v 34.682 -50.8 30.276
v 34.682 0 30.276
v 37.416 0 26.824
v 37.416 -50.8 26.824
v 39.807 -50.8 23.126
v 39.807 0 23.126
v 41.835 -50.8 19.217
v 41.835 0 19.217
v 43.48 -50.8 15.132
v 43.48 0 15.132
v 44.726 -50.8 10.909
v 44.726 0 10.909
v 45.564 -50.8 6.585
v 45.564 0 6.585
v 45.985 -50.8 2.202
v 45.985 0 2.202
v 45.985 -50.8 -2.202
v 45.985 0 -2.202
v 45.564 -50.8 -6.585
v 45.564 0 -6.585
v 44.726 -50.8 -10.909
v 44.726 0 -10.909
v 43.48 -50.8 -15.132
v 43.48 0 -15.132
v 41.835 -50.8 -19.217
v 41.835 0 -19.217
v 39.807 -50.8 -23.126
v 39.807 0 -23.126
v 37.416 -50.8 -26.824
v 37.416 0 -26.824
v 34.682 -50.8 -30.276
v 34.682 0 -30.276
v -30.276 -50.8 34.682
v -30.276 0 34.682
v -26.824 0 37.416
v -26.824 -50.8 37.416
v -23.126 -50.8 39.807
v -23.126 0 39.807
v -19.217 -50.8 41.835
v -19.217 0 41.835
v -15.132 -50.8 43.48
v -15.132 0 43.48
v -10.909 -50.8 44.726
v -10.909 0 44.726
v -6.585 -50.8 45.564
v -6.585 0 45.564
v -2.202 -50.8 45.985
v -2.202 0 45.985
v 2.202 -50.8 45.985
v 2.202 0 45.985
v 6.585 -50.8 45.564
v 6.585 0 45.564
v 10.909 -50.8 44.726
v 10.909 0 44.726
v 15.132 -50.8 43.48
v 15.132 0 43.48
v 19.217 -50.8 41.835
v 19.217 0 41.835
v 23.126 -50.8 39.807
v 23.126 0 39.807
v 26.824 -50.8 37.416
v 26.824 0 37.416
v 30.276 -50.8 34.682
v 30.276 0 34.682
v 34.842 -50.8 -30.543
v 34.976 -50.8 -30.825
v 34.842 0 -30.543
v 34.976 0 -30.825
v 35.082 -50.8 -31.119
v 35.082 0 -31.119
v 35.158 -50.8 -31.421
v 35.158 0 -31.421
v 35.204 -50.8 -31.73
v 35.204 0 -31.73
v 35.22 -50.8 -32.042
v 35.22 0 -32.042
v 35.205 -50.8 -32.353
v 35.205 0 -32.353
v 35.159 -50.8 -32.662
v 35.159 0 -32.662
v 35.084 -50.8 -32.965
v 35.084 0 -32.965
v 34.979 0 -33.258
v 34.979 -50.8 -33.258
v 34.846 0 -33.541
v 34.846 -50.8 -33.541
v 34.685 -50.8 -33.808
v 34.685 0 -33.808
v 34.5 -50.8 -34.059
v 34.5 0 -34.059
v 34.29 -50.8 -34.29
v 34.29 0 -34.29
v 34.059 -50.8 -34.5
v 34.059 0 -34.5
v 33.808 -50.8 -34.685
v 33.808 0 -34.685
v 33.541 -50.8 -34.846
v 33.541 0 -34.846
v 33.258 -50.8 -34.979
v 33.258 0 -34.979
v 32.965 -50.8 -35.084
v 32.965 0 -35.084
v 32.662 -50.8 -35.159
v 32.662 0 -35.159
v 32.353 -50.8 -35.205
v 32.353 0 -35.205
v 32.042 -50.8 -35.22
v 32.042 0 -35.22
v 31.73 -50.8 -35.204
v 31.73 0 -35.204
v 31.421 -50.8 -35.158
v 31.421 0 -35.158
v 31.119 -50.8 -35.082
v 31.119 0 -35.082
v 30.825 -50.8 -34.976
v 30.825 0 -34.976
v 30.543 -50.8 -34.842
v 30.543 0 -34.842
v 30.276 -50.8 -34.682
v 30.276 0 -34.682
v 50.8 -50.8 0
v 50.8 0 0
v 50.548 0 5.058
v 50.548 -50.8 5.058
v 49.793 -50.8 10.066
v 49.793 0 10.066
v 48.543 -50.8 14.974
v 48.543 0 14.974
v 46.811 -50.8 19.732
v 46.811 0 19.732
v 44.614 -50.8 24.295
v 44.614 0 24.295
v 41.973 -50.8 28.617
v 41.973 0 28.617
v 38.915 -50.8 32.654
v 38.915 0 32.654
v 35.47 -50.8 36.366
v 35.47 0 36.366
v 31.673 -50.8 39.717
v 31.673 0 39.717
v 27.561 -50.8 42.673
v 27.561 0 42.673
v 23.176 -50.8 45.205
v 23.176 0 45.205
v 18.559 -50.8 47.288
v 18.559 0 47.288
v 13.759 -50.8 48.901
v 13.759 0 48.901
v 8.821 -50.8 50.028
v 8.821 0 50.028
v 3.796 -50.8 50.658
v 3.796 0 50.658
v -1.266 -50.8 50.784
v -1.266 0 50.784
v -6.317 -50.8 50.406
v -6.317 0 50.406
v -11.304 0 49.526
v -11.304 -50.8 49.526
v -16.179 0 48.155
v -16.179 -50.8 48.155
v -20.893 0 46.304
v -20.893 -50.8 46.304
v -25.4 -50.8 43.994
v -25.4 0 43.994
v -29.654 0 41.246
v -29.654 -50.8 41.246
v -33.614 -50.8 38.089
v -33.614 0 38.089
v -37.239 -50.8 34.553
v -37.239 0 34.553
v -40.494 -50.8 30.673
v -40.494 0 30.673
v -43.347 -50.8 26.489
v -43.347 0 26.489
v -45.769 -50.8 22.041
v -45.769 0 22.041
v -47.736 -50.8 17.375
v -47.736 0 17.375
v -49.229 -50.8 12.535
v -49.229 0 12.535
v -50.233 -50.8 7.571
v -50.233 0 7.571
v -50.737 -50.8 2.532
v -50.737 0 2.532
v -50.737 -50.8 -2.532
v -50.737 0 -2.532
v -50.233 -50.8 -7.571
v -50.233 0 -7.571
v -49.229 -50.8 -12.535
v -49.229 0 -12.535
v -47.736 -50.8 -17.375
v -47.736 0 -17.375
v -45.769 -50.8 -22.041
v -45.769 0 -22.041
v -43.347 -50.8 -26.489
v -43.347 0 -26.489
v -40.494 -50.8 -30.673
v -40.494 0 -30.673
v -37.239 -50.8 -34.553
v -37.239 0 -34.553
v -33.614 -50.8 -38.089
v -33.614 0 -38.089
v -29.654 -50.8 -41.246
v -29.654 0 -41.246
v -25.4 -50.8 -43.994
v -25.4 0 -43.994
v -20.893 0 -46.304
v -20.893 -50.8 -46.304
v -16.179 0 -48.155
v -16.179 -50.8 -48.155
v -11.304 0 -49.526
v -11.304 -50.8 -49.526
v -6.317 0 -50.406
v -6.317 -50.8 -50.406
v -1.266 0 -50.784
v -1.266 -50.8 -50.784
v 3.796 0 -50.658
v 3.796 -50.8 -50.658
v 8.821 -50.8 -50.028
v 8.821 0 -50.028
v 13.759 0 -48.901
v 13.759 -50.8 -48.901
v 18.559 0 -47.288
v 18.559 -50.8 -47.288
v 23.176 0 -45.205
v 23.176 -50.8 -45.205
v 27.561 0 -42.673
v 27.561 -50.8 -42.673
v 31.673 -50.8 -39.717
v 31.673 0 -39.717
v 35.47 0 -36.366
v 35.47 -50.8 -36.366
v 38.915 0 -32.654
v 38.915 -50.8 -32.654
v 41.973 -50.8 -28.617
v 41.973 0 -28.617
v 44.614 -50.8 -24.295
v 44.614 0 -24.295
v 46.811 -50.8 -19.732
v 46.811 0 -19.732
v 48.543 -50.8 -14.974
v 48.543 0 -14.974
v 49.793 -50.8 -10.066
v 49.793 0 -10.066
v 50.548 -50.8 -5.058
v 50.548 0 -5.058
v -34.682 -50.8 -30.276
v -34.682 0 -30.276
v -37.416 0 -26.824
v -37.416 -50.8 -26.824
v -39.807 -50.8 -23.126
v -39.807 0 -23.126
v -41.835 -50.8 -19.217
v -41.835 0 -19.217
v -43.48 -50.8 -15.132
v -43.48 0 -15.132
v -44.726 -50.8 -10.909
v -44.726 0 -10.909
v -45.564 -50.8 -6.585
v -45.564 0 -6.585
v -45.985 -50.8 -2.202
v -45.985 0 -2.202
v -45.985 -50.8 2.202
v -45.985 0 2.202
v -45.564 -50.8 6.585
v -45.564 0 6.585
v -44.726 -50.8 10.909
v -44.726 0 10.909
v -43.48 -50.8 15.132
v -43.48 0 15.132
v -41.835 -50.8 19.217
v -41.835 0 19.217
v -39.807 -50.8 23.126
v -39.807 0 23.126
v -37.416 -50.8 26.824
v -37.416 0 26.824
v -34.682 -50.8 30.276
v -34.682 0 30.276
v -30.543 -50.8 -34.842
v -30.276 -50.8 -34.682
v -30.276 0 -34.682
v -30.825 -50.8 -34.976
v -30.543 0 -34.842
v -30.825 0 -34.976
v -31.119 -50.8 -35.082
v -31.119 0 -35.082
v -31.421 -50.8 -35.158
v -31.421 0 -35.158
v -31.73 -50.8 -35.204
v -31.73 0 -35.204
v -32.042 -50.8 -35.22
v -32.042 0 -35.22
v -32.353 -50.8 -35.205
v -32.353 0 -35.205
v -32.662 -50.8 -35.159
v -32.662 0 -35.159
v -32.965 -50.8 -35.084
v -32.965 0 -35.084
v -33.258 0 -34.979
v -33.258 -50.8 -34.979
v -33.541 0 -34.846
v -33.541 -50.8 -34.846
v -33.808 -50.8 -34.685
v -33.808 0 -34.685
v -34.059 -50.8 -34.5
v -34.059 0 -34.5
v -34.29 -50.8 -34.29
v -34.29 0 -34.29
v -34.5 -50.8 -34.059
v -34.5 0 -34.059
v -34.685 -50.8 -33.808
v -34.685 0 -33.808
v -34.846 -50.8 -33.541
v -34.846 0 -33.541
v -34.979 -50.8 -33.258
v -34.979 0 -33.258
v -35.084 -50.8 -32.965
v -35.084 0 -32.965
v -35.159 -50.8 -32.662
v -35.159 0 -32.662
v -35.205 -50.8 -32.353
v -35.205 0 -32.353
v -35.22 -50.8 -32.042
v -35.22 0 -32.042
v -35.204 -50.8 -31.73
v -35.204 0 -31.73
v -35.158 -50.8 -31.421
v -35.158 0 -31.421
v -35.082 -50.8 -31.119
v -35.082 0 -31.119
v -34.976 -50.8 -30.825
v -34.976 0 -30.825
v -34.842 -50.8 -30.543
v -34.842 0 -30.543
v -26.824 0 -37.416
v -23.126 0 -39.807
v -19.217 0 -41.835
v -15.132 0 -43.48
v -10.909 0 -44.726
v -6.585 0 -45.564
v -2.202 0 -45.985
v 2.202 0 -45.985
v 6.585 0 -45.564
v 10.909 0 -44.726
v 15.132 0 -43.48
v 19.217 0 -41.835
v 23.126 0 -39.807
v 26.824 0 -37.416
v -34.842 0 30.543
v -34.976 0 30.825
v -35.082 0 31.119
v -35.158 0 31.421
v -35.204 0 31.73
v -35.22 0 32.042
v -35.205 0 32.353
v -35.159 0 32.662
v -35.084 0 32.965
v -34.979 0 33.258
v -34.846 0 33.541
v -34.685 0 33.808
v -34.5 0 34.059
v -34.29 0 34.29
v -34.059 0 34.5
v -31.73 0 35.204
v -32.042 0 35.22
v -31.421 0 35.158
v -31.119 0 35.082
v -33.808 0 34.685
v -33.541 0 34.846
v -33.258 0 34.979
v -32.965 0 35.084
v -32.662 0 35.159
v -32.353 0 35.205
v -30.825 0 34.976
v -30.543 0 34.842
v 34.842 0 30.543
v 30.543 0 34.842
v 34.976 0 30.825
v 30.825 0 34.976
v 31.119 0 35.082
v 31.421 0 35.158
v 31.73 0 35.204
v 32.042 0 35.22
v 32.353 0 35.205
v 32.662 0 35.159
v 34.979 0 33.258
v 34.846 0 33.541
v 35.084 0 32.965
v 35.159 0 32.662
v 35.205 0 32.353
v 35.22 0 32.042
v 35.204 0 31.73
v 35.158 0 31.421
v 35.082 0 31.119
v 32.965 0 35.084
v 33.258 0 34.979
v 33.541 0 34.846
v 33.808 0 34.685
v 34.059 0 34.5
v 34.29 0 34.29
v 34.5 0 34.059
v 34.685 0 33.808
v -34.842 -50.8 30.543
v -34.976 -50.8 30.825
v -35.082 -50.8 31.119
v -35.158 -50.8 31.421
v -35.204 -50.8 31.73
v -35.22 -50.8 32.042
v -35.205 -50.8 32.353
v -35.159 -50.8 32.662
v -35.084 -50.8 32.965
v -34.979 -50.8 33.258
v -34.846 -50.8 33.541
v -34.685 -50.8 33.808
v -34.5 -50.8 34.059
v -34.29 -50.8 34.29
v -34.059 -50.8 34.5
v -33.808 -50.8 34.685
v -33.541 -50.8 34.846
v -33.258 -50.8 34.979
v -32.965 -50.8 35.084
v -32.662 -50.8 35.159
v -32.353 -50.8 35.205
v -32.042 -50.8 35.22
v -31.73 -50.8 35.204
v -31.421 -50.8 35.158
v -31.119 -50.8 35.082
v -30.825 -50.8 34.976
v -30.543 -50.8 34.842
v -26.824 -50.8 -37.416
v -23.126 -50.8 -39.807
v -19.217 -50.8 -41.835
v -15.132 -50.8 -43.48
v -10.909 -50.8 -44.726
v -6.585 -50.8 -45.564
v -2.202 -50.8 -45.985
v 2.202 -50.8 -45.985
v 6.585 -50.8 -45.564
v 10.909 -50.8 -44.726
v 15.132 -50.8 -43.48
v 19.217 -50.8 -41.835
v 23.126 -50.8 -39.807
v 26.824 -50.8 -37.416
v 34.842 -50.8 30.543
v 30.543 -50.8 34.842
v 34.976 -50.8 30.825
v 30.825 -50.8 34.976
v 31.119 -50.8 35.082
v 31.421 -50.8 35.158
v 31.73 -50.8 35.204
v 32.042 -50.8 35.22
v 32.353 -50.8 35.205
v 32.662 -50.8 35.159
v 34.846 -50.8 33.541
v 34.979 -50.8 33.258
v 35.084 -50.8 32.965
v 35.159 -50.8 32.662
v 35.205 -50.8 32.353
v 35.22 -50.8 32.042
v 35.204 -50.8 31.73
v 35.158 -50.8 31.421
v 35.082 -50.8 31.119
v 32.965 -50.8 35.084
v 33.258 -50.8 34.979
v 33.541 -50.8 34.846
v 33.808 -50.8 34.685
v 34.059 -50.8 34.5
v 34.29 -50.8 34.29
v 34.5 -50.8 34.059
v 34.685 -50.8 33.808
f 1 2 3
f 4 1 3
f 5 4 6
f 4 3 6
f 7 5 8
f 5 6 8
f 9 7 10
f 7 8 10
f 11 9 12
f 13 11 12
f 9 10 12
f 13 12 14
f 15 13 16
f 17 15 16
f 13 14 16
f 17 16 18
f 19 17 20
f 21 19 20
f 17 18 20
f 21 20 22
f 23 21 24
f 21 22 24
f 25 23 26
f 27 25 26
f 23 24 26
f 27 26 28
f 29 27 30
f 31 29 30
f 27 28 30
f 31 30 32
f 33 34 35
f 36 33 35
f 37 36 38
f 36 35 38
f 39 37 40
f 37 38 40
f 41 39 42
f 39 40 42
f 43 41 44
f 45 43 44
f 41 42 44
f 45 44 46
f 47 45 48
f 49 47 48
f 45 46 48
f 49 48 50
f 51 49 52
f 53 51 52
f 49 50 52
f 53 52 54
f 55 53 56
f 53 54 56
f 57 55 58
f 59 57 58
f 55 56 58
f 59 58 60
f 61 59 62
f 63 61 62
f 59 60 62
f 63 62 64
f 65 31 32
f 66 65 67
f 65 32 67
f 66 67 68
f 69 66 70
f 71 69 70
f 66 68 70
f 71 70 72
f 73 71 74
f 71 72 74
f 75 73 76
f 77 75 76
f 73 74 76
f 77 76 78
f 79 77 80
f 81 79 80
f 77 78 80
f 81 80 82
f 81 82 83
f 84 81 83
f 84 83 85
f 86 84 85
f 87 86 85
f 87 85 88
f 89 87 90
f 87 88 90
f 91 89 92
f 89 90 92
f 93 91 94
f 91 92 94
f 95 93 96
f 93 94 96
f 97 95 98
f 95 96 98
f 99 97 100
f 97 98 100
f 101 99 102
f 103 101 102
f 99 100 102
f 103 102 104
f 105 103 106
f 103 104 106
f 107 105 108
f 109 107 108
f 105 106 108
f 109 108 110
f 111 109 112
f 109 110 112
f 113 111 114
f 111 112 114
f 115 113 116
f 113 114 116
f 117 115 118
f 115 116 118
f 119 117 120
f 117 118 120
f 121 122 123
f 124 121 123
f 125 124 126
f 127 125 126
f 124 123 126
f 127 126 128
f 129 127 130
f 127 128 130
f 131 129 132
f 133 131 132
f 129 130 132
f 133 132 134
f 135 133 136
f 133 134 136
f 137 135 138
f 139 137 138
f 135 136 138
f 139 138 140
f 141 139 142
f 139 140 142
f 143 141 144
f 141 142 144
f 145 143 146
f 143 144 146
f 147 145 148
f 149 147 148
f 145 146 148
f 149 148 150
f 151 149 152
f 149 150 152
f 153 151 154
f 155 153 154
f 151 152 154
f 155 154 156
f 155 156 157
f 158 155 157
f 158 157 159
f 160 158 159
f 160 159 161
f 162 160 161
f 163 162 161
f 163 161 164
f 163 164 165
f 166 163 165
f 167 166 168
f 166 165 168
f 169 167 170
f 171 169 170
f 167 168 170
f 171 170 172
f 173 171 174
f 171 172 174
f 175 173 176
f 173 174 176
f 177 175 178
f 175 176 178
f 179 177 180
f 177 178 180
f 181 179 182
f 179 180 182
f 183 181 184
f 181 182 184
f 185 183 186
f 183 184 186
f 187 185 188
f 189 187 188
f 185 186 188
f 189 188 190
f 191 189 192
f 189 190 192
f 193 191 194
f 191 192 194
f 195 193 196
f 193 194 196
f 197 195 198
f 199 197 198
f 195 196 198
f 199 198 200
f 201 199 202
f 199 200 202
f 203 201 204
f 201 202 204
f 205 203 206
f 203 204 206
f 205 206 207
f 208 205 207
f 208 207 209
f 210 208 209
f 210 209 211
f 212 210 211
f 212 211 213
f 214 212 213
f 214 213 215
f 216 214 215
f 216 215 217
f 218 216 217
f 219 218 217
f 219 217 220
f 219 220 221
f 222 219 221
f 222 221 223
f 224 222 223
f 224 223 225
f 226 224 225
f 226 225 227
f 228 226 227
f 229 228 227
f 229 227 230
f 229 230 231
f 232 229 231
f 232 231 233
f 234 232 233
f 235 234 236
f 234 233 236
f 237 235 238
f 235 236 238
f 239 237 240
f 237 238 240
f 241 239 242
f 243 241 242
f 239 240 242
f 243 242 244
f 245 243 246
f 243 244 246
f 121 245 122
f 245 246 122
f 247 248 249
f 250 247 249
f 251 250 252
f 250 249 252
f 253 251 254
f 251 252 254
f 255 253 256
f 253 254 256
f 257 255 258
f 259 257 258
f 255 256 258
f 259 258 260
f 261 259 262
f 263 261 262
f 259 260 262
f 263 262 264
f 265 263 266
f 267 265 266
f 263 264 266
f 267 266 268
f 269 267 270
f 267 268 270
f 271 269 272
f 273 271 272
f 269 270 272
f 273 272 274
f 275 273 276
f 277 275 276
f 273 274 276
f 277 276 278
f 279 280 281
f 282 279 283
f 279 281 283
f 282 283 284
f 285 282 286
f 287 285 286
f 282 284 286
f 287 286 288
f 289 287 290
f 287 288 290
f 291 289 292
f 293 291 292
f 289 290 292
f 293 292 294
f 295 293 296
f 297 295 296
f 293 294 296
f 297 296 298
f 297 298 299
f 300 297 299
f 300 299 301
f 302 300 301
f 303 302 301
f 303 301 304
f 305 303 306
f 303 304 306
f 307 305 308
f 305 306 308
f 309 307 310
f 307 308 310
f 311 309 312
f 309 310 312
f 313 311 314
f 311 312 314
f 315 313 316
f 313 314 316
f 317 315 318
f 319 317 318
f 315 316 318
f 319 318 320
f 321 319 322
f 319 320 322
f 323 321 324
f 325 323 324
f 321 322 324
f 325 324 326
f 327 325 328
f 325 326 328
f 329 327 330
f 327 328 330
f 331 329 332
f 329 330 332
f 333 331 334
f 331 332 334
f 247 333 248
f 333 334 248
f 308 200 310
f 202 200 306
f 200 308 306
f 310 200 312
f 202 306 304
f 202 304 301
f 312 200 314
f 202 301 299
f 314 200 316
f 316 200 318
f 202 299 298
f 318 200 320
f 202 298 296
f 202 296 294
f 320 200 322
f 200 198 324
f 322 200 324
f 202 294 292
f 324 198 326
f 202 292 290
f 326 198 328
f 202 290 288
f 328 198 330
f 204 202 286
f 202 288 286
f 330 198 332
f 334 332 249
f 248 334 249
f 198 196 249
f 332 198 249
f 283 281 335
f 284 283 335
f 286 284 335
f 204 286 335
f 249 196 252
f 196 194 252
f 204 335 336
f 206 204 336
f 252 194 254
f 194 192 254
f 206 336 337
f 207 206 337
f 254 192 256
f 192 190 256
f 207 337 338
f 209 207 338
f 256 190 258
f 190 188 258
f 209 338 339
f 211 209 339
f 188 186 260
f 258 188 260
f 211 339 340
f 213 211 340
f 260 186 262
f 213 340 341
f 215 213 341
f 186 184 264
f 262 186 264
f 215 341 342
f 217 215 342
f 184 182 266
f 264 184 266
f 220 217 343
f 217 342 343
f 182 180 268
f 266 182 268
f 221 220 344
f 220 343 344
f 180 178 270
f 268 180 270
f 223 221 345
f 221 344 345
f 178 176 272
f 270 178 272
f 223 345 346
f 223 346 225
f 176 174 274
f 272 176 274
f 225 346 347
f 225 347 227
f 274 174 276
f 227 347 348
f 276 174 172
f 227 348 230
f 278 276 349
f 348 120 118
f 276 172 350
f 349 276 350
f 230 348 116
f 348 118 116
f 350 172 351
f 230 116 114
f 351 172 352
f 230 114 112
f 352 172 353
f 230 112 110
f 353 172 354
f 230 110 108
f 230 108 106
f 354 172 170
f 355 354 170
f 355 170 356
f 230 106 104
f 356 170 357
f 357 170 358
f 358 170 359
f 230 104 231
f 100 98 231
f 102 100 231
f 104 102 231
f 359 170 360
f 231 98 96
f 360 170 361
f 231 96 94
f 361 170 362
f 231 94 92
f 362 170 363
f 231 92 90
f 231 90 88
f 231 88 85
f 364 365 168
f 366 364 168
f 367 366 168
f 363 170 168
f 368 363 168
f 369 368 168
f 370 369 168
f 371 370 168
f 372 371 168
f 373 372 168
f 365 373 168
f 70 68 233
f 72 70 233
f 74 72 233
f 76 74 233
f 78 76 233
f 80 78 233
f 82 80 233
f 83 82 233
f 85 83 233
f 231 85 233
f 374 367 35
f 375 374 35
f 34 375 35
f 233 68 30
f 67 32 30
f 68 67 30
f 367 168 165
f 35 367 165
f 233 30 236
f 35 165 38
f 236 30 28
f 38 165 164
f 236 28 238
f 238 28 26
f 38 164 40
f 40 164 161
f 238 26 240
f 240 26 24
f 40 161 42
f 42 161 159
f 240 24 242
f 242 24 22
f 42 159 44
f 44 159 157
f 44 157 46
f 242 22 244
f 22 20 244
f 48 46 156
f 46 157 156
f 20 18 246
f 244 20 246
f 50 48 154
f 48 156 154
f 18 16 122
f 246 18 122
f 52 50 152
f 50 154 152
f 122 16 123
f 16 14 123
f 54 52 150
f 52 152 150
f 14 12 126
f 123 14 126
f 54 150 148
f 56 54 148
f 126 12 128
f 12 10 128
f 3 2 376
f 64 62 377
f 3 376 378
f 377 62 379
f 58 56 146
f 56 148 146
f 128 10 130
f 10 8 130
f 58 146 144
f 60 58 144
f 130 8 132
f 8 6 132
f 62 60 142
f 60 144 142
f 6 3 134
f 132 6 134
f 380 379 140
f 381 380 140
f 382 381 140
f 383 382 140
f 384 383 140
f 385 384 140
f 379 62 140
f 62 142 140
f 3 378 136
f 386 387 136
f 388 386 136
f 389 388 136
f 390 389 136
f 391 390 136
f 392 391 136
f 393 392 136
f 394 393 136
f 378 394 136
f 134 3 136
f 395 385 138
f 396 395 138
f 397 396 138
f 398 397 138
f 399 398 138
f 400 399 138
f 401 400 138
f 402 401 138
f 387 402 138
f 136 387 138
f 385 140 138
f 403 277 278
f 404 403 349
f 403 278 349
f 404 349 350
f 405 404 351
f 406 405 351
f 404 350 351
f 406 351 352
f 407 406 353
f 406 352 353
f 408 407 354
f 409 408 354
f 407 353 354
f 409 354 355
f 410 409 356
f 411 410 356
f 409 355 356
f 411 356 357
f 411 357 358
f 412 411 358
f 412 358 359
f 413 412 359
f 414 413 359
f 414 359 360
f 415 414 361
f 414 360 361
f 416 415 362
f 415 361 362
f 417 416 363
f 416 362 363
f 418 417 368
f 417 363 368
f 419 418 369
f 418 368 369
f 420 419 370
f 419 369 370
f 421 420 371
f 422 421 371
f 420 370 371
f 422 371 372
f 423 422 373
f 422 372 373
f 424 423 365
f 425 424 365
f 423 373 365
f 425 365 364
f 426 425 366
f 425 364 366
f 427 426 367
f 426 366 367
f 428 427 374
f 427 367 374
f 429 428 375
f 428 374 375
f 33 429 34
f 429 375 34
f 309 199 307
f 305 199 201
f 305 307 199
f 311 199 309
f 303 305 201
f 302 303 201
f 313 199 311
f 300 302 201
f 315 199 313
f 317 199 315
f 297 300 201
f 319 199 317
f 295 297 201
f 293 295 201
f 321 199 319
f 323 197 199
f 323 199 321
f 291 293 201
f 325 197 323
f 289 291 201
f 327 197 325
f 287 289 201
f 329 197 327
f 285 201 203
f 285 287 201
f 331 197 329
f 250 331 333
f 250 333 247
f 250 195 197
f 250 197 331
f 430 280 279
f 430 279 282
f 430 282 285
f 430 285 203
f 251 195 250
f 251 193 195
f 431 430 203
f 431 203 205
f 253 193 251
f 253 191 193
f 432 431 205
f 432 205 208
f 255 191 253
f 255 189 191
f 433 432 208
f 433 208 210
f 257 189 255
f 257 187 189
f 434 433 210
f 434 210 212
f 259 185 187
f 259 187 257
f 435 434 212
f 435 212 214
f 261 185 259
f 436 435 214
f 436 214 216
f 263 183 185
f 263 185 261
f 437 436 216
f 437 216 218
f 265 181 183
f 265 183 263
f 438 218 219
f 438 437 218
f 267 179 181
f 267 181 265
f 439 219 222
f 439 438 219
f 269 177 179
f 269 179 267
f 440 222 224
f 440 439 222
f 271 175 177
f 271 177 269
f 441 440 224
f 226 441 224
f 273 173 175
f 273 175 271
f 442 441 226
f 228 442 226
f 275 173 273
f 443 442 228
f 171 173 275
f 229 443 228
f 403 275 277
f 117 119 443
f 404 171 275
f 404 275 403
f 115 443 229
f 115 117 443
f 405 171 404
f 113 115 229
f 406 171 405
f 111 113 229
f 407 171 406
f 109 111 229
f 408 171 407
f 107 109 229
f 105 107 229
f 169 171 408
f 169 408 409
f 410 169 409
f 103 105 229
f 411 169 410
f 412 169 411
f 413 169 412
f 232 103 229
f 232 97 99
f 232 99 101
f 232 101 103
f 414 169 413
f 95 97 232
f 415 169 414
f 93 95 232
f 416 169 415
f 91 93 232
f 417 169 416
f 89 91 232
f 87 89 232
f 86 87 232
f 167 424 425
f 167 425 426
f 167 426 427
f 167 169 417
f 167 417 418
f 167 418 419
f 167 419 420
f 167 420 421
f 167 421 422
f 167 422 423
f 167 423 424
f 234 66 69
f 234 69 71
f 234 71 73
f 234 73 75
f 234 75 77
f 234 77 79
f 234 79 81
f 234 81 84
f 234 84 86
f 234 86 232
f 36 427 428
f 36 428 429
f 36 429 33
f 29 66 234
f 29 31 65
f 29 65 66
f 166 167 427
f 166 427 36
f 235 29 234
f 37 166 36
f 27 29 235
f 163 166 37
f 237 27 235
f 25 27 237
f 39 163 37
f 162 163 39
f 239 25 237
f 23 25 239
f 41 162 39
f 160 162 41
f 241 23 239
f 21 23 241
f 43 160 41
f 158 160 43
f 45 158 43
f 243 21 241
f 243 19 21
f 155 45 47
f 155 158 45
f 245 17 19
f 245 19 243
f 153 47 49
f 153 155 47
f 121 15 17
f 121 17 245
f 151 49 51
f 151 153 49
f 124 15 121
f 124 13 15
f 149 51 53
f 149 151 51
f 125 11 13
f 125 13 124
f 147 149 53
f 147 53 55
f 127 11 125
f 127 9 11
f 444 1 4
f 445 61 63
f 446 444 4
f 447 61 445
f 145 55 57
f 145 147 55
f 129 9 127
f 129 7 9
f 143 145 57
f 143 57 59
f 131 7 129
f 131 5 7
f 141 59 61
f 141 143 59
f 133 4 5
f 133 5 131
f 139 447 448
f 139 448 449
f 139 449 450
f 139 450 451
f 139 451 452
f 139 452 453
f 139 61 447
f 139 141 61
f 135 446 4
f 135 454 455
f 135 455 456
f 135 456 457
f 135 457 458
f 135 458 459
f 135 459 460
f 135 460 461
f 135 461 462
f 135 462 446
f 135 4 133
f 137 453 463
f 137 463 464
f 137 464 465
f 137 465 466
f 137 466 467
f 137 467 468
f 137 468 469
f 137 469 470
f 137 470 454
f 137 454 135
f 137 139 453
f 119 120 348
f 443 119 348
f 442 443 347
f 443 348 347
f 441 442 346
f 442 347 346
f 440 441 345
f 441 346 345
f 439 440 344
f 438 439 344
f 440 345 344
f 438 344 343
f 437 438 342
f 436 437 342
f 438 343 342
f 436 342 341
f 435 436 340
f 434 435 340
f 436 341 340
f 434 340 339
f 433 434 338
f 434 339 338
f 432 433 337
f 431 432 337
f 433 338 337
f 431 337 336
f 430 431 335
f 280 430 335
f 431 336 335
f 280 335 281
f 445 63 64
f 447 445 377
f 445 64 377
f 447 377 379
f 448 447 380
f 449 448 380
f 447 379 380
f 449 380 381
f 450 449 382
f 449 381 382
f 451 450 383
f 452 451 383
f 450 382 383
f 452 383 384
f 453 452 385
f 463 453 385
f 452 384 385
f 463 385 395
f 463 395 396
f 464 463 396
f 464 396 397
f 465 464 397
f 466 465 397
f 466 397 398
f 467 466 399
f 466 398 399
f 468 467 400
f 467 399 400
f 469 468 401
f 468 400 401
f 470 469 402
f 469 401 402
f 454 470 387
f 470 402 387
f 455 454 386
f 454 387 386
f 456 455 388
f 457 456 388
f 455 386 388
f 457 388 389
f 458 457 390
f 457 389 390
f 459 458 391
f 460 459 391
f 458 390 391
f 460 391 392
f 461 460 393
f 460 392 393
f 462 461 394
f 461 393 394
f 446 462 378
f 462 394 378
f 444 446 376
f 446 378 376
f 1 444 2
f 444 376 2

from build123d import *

# Parameters (mm, degrees)
F0_R     = 50.8
F1_DEPTH = 50.8


with BuildPart() as f1:
    # F0 (on Front) → F1 (new body)
    with BuildSketch(Plane.XZ):
        Circle(F0_R)
        with BuildLine():
            ThreePointArc((-34.681557, 30.27608), (-34.29, 34.29), (-30.27608, 34.681557))
            ThreePointArc((-30.27608, 34.681557), (0, 46.0375), (30.27608, 34.681557))
            ThreePointArc((30.27608, 34.681557), (34.29, 34.29), (34.681557, 30.27608))
            ThreePointArc((34.681557, 30.27608), (46.0375, 0), (34.681557, -30.27608))
            ThreePointArc((34.681557, -30.27608), (34.29, -34.29), (30.27608, -34.681557))
            ThreePointArc((30.27608, -34.681557), (0, -46.0375), (-30.27608, -34.681557))
            ThreePointArc((-30.27608, -34.681557), (-34.29, -34.29), (-34.681557, -30.27608))
            ThreePointArc((-34.681557, -30.27608), (-46.0375, 0), (-34.681557, 30.27608))
        make_face(mode=Mode.SUBTRACT)
    extrude(amount=F1_DEPTH)


solid = f1.part
